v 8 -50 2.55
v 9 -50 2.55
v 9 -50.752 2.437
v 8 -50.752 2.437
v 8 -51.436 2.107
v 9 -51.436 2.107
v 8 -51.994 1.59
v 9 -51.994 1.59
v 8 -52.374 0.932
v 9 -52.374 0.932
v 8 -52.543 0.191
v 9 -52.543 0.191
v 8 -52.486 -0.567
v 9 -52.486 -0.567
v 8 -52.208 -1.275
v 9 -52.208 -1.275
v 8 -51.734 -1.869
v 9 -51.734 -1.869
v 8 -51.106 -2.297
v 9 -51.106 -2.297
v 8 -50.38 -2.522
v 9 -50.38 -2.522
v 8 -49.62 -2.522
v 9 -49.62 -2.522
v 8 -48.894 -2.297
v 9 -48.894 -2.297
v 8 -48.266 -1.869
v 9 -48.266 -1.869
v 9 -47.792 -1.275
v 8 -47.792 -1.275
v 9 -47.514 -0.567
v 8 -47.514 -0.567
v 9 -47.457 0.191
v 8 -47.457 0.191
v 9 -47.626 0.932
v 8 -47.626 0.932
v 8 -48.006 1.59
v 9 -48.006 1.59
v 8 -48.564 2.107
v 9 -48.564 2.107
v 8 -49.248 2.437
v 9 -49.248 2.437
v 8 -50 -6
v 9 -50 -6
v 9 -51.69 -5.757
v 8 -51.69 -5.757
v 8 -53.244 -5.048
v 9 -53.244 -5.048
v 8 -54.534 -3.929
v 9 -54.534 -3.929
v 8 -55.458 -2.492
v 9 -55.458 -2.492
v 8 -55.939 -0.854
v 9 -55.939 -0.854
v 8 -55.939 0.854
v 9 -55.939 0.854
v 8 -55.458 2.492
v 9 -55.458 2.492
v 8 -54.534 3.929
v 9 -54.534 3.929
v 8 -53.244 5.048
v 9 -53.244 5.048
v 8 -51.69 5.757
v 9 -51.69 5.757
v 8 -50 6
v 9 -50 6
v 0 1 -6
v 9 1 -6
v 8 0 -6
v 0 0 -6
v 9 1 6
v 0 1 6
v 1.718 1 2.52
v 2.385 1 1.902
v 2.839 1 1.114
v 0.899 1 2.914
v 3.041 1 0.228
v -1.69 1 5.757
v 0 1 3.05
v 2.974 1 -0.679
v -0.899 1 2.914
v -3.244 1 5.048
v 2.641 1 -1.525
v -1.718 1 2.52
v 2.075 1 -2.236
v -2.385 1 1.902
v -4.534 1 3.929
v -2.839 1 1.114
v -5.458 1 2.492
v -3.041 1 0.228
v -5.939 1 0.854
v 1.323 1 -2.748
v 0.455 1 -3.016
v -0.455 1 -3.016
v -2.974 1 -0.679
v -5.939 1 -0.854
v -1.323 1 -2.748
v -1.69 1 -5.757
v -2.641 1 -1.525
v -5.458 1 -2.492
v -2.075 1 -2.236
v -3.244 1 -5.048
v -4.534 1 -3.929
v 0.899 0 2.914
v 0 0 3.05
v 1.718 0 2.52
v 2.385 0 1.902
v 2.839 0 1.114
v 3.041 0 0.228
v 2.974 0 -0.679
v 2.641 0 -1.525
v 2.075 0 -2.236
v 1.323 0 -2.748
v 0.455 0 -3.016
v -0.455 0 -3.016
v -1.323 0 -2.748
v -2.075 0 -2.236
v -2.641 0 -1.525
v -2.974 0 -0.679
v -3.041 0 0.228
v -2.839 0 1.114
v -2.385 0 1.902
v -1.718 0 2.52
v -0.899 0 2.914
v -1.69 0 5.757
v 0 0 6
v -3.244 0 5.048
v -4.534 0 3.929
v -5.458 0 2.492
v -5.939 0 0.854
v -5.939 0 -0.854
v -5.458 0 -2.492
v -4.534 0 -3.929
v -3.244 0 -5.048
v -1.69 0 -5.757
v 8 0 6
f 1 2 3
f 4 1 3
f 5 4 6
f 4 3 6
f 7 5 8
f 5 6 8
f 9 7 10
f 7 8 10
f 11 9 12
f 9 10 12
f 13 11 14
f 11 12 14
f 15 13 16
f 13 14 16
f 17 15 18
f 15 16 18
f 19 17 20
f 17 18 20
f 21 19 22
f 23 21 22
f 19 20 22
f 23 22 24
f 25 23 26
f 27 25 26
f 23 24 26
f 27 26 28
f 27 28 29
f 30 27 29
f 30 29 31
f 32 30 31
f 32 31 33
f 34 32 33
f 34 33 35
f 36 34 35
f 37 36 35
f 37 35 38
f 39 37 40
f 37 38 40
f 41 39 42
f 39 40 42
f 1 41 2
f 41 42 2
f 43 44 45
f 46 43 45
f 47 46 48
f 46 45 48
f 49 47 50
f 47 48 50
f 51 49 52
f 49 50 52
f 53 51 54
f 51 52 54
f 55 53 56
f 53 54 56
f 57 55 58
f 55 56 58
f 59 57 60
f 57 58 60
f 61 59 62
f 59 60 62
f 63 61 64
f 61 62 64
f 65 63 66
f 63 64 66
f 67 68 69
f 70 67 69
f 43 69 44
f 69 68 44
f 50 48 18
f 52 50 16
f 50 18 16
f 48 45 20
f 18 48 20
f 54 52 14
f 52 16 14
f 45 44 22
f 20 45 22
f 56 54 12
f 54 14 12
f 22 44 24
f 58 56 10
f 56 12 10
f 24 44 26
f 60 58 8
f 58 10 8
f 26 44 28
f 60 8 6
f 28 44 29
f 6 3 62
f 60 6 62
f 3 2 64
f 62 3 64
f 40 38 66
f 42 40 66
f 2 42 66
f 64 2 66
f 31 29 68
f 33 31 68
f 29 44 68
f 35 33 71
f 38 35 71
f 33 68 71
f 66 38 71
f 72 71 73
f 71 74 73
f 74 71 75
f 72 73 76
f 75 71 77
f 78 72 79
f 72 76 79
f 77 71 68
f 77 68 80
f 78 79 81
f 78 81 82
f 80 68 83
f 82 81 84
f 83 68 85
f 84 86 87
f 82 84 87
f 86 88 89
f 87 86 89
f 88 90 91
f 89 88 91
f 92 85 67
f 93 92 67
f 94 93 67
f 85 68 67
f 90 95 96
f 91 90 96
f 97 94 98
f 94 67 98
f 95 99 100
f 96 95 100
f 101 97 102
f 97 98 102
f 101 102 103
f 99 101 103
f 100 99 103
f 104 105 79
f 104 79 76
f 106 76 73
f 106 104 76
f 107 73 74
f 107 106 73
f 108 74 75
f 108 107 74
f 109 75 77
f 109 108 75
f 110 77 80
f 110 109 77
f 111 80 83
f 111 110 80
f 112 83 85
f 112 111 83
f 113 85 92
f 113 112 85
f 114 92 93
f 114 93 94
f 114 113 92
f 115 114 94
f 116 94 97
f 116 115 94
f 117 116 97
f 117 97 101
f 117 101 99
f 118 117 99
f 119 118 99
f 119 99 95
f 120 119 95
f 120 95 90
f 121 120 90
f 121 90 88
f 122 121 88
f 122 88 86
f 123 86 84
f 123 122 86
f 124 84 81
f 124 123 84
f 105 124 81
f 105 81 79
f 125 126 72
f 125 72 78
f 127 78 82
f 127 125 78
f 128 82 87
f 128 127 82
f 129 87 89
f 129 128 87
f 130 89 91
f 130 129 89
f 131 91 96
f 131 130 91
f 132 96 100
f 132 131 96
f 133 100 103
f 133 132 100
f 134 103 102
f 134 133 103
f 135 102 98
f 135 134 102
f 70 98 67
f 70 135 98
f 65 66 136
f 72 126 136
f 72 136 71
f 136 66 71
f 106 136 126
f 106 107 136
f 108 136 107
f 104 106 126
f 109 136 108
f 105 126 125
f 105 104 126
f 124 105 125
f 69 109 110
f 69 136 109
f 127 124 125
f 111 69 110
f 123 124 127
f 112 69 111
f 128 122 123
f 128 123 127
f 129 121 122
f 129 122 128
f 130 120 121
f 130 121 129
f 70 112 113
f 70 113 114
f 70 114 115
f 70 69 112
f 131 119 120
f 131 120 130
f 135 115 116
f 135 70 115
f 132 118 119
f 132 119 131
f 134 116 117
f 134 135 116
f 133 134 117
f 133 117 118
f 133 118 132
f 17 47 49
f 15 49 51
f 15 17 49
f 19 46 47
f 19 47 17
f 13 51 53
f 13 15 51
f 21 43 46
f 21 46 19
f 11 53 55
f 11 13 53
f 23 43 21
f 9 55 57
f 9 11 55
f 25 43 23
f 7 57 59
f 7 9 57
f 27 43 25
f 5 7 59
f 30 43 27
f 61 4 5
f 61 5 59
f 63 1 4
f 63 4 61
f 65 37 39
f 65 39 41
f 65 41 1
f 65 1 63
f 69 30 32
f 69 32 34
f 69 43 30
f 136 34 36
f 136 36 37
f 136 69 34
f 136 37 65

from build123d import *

# Parameters (mm, degrees)
SKETCH1_R           = 3.05
BOSS_EXTRUDE1_DEPTH = 1
BOSS_EXTRUDE2_START = 9
SKETCH3_R           = 2.55
BOSS_EXTRUDE2_DEPTH = 1


with BuildPart() as part:
    # Sketch1 → Boss-Extrude1 (new body)
    with BuildSketch(Plane(origin=(0, 0, 0), x_dir=(1, 0, 0), z_dir=(0, 1, 0))):
        with BuildLine():
            Line((0, 6), (9, 6))
            Line((9, 6), (9, -6))
            Line((9, -6), (0, -6))
            ThreePointArc((0, -6), (-6, 0), (0, 6))
        make_face()
        with Locations(Location((0, 0, 0), (0, 0, 270))):
            Circle(SKETCH1_R, mode=Mode.SUBTRACT)
    extrude(amount=BOSS_EXTRUDE1_DEPTH)

    # Sketch3 → Boss-Extrude2 (add)
    with BuildSketch(Plane(origin=(0, 0, 0), x_dir=(0, 0, -1), z_dir=(1, 0, 0)).offset(BOSS_EXTRUDE2_START)):
        with BuildLine():
            Line((-6, 0), (6, 0))
            Line((6, 0), (6, -50))
            ThreePointArc((6, -50), (0, -56), (-6, -50))
            Line((-6, -50), (-6, 0))
        make_face()
        with Locations(Location((0, -50, 0), (0, 0, 180))):
            Circle(SKETCH3_R, mode=Mode.SUBTRACT)
    extrude(amount=-BOSS_EXTRUDE2_DEPTH)


solid = part.part
